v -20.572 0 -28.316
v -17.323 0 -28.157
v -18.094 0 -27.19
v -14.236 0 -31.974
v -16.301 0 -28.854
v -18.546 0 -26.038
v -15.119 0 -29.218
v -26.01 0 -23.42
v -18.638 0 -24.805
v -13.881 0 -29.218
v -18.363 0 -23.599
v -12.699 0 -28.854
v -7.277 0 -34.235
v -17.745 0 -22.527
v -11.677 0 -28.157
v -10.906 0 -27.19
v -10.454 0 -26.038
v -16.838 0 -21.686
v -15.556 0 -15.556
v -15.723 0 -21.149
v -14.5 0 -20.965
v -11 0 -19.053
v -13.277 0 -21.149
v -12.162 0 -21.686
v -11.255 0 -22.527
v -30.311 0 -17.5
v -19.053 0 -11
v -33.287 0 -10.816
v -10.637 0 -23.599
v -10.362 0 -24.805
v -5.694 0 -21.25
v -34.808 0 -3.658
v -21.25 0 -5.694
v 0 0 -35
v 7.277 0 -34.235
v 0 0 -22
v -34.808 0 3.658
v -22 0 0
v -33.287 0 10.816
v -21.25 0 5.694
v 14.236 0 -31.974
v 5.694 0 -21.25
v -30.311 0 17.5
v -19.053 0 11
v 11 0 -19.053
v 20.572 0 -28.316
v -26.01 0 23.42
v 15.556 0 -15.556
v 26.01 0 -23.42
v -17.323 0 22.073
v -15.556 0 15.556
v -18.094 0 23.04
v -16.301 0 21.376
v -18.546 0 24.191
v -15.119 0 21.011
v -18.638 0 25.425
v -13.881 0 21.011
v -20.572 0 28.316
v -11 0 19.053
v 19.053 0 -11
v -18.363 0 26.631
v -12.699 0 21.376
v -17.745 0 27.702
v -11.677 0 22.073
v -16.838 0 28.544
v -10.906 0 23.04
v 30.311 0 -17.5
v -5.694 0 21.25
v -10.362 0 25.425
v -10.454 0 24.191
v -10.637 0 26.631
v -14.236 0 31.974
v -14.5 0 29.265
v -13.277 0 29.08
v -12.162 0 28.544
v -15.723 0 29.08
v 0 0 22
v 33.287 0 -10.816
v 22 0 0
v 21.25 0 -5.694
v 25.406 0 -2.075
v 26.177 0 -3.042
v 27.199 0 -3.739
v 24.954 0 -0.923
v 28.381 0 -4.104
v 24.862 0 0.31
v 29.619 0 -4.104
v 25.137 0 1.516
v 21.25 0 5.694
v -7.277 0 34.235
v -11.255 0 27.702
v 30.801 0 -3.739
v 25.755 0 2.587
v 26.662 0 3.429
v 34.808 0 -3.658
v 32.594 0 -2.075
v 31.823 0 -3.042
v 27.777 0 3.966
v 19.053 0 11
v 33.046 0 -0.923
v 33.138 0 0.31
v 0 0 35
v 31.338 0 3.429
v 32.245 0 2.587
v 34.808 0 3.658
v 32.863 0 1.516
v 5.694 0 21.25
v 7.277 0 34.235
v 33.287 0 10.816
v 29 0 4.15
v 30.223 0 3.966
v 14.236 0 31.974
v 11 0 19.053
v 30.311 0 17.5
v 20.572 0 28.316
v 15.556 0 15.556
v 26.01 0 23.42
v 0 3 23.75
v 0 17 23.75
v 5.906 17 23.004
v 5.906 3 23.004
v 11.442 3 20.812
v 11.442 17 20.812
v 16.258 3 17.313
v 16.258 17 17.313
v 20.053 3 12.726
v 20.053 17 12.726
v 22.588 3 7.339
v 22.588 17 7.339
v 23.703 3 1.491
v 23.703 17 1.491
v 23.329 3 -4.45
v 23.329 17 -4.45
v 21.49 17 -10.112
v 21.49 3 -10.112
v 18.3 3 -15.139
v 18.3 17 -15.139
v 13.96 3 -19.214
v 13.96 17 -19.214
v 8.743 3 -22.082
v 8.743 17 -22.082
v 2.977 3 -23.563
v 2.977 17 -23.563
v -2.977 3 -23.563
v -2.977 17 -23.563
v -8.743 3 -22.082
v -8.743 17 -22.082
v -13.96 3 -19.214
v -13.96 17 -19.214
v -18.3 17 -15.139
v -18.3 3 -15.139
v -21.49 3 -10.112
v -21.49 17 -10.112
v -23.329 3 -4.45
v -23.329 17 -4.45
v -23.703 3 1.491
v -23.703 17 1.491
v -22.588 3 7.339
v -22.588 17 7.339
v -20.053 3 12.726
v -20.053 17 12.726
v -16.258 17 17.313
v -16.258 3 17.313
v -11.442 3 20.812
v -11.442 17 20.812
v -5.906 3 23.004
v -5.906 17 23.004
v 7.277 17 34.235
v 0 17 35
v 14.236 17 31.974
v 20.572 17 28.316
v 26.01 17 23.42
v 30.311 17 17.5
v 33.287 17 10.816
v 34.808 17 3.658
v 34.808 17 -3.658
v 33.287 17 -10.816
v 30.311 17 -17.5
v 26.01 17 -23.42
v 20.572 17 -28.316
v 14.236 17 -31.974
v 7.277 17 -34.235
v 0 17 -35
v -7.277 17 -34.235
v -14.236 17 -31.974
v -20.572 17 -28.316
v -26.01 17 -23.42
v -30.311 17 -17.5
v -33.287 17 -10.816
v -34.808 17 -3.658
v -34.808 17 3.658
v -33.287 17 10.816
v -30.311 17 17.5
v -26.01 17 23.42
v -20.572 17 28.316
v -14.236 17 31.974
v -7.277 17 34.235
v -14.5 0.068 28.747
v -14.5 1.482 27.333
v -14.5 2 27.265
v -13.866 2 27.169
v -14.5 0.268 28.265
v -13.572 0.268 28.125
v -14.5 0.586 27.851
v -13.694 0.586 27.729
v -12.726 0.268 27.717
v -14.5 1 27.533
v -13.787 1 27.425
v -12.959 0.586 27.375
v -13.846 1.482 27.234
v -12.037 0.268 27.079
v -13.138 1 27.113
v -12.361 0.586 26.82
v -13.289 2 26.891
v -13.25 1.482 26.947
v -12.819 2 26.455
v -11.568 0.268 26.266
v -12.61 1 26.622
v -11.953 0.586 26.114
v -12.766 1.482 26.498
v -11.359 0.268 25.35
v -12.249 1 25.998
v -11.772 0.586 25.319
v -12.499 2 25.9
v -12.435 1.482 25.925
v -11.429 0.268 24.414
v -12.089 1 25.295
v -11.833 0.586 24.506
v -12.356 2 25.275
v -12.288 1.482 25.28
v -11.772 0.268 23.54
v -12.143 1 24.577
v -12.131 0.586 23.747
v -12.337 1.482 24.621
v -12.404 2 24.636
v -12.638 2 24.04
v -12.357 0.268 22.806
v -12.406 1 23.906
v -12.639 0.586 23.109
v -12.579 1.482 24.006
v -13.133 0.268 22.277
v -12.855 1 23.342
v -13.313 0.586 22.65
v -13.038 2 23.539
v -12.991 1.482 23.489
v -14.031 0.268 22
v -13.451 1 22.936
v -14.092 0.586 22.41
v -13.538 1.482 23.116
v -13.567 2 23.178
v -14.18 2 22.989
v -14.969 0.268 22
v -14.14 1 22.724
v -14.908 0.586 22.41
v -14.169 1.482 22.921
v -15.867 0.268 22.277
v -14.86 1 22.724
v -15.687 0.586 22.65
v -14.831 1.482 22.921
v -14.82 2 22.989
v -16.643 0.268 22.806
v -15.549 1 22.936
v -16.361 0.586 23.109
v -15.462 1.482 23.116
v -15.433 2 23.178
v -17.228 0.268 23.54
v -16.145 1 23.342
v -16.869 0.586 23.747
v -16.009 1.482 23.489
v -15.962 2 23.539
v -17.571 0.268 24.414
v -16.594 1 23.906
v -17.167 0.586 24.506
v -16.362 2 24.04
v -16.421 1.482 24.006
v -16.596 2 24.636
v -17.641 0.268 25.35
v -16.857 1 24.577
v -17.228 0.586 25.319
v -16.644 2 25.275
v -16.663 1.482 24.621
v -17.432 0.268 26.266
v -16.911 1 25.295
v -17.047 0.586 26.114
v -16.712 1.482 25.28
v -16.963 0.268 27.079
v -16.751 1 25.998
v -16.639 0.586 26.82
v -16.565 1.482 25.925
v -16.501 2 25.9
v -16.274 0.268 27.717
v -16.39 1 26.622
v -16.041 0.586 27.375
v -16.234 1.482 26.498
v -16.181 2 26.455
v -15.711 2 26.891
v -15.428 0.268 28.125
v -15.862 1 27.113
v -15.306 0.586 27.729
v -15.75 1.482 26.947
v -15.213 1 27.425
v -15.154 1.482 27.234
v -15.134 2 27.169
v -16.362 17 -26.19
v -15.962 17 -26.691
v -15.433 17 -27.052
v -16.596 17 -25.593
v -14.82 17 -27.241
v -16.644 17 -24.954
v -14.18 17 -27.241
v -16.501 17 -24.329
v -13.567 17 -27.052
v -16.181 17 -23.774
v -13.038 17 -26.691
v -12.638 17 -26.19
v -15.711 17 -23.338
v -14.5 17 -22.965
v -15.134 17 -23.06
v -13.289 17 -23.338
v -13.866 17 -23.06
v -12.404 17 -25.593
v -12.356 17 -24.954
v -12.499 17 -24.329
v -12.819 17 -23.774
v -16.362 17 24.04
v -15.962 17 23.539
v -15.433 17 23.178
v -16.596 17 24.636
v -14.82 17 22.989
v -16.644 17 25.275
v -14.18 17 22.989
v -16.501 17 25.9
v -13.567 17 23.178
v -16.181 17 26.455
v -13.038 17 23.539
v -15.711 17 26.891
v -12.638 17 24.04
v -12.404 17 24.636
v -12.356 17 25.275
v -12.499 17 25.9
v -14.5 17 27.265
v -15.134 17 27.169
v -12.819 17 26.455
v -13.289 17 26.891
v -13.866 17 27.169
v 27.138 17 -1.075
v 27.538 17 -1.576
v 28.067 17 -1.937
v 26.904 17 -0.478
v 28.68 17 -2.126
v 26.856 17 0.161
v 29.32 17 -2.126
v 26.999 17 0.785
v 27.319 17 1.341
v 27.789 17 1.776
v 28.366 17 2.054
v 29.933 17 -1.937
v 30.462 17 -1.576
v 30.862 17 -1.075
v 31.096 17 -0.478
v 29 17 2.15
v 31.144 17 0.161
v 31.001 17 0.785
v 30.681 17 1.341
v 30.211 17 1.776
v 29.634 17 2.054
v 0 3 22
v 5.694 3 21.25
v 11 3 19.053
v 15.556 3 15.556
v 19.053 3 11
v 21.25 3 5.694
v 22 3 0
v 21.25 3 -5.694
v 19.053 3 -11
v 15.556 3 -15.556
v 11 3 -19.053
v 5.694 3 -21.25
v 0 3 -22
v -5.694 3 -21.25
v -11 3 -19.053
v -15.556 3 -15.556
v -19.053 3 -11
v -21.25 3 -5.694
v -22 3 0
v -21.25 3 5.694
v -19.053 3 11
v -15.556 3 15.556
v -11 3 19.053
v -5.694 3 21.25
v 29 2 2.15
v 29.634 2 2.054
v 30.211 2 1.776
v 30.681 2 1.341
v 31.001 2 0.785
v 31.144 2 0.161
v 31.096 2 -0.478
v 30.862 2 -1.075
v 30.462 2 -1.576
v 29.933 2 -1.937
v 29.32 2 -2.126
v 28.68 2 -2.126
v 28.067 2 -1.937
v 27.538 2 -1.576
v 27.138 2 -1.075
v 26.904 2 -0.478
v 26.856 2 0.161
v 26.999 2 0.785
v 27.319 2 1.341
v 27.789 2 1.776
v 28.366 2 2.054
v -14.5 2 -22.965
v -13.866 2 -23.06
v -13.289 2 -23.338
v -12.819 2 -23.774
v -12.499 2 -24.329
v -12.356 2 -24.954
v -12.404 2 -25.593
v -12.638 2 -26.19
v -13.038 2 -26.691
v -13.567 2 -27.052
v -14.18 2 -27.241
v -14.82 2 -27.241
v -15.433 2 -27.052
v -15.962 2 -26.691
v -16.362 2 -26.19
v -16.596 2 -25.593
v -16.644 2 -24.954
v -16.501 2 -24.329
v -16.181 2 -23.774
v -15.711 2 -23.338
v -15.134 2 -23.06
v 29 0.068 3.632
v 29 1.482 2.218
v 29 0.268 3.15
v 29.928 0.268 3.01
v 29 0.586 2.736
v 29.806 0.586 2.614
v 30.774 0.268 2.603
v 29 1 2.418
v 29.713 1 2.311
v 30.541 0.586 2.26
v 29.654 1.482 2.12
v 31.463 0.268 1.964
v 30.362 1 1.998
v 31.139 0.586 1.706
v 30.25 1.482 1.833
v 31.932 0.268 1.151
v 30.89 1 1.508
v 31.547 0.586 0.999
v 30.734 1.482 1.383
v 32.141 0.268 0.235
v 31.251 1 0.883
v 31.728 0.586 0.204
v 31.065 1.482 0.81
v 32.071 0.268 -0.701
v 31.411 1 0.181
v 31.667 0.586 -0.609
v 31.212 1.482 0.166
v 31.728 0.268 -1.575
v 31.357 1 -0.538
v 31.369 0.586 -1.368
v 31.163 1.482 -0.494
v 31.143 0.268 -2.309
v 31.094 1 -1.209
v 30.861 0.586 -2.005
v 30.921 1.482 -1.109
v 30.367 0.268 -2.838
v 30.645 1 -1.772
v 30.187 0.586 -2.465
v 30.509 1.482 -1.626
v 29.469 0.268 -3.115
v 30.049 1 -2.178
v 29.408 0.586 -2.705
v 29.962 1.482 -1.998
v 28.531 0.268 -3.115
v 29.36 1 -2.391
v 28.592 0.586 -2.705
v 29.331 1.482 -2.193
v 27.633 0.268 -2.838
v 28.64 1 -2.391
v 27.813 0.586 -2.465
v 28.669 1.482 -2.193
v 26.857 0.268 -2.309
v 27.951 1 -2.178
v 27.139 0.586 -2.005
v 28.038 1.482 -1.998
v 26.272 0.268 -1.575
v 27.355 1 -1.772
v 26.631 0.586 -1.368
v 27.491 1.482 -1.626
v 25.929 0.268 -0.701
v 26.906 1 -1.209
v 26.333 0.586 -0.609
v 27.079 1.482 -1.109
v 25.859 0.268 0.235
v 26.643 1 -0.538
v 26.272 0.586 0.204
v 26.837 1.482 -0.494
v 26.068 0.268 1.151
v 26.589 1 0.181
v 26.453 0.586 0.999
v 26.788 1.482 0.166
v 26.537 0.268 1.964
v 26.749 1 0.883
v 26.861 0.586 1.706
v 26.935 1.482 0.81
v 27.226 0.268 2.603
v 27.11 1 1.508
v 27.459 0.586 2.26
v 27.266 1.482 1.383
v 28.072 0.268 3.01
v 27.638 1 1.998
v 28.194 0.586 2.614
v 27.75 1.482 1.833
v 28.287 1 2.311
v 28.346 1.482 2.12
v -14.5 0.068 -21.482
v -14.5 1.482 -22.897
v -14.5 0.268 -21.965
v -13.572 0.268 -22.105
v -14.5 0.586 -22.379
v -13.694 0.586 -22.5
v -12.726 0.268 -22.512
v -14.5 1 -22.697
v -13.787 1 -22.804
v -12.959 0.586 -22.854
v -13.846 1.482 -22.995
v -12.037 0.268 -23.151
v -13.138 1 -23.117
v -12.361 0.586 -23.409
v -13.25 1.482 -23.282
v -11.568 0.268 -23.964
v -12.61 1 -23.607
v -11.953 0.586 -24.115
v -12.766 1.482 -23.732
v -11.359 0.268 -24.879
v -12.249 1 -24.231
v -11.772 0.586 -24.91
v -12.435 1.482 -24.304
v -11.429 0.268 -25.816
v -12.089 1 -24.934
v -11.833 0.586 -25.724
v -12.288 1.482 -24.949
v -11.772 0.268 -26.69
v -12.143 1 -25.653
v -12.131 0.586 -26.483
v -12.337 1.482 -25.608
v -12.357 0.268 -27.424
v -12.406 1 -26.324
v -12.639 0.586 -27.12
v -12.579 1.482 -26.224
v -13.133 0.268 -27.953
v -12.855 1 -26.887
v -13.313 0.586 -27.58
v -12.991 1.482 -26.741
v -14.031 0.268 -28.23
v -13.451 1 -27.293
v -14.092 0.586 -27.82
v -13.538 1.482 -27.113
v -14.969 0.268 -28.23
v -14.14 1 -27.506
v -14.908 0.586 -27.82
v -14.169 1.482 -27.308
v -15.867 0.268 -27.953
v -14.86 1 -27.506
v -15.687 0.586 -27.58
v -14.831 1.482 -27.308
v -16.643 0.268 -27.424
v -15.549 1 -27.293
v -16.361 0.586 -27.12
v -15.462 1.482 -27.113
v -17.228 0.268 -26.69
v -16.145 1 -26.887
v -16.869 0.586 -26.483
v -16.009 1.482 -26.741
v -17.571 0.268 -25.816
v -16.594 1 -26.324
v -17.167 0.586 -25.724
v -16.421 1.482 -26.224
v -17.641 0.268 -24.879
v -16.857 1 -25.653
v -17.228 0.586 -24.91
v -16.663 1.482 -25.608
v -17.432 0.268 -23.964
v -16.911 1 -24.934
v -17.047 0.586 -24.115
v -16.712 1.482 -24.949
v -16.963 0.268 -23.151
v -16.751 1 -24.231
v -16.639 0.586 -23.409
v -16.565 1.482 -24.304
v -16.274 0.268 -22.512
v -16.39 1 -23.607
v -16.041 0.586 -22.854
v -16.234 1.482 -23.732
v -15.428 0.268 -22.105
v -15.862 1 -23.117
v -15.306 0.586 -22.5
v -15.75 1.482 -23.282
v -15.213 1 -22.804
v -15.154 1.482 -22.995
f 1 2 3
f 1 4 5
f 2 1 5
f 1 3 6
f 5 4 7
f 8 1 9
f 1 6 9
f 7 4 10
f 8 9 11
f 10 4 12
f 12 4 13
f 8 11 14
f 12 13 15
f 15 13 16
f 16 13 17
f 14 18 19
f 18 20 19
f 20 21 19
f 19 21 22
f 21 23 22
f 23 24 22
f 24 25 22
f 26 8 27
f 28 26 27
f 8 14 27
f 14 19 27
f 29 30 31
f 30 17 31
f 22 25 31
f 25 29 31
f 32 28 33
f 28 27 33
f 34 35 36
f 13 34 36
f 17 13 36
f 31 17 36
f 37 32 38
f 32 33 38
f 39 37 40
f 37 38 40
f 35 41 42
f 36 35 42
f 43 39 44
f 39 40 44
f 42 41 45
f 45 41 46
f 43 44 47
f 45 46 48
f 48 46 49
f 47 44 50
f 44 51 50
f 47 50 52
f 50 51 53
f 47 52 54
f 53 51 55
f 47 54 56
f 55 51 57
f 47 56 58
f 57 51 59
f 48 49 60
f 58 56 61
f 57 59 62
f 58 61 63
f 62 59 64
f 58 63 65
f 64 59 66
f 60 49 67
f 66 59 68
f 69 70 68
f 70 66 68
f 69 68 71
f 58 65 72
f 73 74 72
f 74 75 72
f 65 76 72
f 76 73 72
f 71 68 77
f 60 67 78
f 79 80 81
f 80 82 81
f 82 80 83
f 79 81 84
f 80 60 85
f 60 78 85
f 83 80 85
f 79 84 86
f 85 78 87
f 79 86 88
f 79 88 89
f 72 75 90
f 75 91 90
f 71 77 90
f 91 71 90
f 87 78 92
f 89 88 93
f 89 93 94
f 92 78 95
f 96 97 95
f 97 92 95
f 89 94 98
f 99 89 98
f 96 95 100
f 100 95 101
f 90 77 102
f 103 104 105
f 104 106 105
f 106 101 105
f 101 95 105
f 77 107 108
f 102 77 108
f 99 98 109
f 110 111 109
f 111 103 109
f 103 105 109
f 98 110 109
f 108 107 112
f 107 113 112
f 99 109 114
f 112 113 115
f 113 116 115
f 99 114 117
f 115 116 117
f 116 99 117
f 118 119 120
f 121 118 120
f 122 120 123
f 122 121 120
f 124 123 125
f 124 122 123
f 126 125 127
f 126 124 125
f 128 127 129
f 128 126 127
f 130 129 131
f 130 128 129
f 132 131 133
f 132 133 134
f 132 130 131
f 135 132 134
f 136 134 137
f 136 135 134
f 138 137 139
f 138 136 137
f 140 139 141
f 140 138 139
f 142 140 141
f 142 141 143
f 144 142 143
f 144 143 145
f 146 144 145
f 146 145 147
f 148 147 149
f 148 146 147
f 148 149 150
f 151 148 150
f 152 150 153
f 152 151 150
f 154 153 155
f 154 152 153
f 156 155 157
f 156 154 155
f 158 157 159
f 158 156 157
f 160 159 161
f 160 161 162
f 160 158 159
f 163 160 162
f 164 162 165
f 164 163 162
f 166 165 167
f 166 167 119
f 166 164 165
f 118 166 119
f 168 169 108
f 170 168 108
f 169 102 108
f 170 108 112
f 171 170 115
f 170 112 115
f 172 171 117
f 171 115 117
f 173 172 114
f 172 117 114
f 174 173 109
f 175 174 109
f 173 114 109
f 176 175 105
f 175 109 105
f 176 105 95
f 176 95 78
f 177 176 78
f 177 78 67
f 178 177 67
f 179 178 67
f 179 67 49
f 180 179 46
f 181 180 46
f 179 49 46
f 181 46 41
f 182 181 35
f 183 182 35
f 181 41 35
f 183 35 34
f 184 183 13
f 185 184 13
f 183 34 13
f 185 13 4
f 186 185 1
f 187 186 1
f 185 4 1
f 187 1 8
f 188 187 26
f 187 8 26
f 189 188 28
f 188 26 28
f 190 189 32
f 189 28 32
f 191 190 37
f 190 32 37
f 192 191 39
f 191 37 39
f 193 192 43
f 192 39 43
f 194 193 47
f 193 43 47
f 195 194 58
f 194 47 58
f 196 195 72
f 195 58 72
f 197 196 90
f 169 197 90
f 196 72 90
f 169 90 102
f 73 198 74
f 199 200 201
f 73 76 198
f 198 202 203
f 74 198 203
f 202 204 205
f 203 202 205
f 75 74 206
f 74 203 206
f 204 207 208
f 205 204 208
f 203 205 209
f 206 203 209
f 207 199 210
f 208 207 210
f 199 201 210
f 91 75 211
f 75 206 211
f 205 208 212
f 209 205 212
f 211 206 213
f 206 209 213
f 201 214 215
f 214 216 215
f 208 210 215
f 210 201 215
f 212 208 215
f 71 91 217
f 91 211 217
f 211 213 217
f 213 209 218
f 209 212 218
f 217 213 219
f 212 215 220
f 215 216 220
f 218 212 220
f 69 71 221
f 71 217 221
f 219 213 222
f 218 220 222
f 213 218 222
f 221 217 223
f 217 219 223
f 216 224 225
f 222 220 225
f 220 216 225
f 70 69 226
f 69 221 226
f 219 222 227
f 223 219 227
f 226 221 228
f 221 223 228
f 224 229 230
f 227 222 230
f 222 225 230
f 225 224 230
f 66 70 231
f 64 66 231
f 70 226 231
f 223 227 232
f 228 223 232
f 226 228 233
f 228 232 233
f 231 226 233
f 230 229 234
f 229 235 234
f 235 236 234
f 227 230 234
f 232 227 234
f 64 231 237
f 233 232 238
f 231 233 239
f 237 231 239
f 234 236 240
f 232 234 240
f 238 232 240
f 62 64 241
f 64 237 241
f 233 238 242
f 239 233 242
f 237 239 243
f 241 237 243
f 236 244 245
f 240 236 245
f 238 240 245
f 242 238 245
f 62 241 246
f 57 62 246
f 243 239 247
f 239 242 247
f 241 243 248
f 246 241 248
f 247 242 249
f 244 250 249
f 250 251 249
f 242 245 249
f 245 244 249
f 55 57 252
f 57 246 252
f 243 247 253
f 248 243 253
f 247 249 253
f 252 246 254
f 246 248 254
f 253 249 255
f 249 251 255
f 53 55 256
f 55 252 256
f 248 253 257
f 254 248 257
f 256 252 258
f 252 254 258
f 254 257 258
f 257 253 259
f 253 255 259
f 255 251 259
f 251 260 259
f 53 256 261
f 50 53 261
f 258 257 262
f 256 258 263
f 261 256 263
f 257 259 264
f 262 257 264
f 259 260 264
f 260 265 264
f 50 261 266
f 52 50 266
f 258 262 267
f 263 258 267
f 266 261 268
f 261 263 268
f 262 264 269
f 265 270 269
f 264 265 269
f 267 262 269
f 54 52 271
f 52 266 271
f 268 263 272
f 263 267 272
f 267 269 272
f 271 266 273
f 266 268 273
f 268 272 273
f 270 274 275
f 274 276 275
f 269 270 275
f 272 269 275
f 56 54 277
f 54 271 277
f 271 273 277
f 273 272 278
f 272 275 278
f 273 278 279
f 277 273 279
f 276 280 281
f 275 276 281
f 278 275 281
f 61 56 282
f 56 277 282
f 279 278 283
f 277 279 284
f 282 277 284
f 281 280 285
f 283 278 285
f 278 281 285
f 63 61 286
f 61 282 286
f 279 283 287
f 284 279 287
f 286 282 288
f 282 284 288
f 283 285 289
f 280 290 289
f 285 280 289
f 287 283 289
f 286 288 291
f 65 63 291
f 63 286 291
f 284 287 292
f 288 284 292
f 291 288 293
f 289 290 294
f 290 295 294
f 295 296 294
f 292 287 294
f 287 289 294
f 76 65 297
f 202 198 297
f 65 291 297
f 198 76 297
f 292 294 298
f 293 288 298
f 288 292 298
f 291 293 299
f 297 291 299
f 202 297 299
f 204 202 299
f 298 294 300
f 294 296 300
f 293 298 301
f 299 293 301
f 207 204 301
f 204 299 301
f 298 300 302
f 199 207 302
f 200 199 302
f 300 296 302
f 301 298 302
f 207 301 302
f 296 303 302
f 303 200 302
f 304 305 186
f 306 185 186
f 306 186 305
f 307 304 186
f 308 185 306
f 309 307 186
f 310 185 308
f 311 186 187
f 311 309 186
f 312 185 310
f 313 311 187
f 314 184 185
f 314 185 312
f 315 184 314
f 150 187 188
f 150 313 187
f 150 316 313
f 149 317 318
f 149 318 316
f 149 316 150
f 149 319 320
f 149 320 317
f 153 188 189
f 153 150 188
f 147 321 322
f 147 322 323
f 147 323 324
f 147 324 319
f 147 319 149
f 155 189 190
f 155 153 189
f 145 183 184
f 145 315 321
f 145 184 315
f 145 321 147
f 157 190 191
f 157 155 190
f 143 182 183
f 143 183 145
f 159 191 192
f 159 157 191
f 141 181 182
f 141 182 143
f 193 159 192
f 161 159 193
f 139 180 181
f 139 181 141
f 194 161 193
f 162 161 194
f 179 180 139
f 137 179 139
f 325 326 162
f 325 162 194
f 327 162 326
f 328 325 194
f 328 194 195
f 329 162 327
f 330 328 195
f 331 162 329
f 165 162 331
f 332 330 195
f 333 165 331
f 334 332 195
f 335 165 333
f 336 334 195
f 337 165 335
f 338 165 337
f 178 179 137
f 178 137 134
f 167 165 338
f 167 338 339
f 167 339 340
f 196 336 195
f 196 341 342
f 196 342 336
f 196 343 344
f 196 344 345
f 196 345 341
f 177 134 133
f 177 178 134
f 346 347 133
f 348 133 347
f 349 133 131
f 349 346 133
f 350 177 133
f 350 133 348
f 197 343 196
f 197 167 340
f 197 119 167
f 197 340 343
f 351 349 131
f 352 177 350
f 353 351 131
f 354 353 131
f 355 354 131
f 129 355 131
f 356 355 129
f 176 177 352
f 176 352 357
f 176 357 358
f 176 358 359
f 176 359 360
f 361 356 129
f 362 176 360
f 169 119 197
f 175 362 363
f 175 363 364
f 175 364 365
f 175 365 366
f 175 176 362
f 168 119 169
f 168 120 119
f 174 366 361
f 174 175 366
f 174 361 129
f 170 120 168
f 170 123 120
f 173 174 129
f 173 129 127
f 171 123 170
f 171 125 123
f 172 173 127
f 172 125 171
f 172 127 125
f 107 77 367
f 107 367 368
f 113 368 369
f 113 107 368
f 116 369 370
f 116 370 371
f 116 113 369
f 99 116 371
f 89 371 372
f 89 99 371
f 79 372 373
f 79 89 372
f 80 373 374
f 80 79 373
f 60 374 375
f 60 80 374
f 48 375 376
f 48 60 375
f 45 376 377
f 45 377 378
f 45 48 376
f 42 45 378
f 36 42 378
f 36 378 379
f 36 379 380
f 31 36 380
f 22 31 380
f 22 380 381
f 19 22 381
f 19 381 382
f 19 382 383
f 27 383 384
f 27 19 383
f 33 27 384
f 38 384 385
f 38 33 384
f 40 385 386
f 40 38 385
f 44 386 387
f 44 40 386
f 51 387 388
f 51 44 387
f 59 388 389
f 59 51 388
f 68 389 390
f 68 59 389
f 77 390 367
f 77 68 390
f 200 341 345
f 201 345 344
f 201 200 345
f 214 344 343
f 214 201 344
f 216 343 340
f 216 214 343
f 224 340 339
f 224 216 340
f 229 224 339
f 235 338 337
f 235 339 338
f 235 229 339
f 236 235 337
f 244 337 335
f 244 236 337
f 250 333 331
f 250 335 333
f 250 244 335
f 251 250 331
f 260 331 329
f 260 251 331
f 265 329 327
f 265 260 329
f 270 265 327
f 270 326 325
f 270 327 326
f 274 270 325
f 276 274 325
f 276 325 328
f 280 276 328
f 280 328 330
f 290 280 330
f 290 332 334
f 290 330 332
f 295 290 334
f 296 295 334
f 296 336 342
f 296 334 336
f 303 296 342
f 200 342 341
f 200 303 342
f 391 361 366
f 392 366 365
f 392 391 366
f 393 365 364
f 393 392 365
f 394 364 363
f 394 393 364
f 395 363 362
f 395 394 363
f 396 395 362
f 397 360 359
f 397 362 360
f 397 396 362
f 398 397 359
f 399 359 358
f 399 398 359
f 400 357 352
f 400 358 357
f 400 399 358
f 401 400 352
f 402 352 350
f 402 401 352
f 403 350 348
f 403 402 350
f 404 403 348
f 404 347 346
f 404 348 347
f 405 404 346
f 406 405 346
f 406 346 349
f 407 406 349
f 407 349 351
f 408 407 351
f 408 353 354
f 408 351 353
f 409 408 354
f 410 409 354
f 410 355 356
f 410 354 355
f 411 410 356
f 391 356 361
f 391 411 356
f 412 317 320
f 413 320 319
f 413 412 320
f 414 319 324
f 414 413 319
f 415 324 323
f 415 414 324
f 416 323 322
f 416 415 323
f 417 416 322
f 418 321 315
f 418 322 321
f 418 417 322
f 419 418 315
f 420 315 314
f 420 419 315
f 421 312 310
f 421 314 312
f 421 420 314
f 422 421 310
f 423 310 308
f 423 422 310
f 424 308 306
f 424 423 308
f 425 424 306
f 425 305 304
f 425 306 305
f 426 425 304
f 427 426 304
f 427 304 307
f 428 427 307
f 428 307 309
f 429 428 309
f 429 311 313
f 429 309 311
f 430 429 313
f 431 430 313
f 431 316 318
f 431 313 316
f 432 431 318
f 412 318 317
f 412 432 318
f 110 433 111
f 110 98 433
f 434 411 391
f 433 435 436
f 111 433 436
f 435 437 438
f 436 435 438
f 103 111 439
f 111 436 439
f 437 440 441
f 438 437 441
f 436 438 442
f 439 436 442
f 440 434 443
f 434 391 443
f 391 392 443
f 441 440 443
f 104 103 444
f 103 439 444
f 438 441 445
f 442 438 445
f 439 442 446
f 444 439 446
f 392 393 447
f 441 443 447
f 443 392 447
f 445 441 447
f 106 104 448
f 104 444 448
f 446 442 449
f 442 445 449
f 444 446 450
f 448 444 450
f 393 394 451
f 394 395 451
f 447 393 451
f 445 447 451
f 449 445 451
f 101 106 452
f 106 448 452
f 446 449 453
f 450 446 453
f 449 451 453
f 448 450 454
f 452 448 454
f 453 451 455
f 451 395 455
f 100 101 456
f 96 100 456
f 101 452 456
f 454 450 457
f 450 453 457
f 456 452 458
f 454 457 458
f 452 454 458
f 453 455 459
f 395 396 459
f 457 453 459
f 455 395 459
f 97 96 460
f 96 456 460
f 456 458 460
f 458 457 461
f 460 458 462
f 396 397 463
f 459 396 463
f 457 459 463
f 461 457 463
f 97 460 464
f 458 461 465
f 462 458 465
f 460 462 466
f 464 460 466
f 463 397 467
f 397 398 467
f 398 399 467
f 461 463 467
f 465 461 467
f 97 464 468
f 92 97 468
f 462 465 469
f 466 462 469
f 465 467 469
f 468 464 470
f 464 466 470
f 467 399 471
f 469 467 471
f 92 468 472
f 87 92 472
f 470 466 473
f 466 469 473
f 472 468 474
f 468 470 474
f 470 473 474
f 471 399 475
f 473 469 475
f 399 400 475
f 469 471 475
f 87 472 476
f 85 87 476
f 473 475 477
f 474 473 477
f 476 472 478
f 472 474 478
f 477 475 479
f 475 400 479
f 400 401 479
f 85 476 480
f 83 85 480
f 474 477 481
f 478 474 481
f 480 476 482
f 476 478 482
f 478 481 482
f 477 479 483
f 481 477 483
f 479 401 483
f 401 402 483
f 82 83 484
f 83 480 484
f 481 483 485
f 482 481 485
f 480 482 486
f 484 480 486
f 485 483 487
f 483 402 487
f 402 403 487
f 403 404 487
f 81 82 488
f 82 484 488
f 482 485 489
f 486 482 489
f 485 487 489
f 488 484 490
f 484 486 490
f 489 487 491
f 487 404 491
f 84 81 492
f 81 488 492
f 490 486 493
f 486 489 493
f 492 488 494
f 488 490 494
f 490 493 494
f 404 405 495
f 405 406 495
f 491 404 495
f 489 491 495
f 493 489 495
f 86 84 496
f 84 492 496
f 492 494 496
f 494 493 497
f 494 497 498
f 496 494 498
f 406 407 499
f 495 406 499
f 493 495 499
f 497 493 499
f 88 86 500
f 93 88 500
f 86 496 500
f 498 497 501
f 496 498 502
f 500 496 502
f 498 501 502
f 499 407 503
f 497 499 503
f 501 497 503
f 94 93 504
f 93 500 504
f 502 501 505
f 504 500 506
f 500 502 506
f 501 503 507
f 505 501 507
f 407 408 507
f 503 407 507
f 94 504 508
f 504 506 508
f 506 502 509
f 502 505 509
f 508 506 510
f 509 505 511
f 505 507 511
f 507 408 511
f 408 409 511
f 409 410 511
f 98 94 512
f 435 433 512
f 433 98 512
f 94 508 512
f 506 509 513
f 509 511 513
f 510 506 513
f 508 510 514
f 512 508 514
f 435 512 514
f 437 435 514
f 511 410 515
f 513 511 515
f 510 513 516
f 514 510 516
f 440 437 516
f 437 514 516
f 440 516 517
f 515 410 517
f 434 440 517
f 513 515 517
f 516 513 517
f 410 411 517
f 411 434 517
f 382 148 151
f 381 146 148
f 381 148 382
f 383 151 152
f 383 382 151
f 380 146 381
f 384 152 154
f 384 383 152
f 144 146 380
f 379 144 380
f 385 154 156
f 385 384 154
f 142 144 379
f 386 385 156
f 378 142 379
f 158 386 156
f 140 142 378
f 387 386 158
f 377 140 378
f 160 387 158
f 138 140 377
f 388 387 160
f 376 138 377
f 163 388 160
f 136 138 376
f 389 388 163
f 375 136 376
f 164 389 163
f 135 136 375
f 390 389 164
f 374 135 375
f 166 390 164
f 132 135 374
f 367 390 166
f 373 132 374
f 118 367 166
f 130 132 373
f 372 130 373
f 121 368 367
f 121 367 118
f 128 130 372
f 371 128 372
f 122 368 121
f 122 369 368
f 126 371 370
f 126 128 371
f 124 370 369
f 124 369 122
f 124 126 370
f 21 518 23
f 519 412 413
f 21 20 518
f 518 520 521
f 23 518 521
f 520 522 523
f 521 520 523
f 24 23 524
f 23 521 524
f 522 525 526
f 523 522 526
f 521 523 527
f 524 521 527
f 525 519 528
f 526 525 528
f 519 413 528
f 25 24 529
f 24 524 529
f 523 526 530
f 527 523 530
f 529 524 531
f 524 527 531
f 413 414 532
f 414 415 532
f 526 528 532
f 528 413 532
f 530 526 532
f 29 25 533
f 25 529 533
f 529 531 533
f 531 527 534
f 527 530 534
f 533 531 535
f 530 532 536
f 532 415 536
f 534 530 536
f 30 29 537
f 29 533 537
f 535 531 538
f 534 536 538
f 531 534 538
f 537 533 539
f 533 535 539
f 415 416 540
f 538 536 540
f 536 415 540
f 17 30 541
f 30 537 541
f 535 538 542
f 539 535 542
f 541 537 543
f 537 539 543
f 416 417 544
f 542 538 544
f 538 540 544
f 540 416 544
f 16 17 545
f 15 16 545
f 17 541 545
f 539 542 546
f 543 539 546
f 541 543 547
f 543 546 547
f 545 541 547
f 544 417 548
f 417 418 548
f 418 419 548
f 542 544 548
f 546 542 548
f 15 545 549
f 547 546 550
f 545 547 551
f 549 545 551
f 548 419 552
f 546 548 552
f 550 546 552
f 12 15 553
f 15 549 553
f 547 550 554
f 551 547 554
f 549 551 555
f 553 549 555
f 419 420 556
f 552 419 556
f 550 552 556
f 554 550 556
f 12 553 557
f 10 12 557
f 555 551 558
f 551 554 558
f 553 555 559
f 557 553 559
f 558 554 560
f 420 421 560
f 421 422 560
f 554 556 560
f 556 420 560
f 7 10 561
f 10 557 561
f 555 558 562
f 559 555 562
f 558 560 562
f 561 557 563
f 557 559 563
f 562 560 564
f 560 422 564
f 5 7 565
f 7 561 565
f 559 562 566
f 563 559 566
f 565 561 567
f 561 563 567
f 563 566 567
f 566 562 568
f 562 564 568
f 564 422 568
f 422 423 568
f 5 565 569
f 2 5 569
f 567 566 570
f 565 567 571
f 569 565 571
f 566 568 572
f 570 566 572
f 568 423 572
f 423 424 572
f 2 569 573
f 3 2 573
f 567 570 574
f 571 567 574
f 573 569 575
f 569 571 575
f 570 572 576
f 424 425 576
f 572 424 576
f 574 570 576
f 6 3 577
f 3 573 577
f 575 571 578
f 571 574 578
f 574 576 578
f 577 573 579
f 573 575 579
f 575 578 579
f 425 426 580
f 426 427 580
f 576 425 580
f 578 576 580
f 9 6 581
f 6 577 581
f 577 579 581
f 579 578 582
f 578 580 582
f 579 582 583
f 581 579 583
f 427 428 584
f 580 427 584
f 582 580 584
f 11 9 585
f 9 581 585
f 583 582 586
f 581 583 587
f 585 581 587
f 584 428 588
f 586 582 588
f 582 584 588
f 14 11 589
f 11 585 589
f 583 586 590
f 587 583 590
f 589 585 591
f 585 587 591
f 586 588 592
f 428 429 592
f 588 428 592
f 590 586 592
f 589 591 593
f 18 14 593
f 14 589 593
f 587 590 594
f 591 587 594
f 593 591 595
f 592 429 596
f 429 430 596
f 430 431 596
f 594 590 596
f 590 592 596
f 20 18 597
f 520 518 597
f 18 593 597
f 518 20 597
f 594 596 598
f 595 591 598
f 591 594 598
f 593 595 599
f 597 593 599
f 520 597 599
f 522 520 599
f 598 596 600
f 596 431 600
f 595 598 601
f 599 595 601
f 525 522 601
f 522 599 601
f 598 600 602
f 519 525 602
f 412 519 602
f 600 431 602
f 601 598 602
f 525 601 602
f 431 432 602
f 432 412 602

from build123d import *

# Parameters (mm, degrees)
SKETCH_1_R          = 35
SKETCH_1_R_2        = 22
EXTRUDE_1_DEPTH     = 3
SKETCH_2_R          = 35
SKETCH_2_R_2        = 23.75
EXTRUDE_2_DEPTH     = 14
SKETCH_4_R          = 2.15
CUT_EXTRUDE_1_DEPTH = 70
FILLET_1_R          = 2


with BuildPart() as part:
    # 草图1 → 凸台-拉伸1 (new body)
    with BuildSketch(Plane(origin=(0, 0, 0), x_dir=(1, 0, 0), z_dir=(0, 1, 0))):
        with Locations(Location((0, 0, 0), (0, 0, 270))):
            Circle(SKETCH_1_R)
        with Locations(Location((0, 0, 0), (0, 0, 270))):
            Circle(SKETCH_1_R_2, mode=Mode.SUBTRACT)
    extrude(amount=EXTRUDE_1_DEPTH)

    # 草图2 → 凸台-拉伸2 (add)
    with BuildSketch(Plane(origin=(0, 3, 0), x_dir=(1, 0, 0), z_dir=(0, 1, 0))):
        with Locations(Location((0, 0, 0), (0, 0, 270))):
            Circle(SKETCH_2_R)
        with Locations(Location((0, 0, 0), (0, 0, 270))):
            Circle(SKETCH_2_R_2, mode=Mode.SUBTRACT)
    extrude(amount=EXTRUDE_2_DEPTH)

    # 草图4 → 切除-拉伸1 (cut)
    with BuildSketch(Plane(origin=(0, 0, 0), x_dir=(1, 0, 0), z_dir=(0, 1, 0))):
        with Locations(Location((29, 0, 0), (0, 0, 270))):
            Circle(SKETCH_4_R)
        with Locations(Location((-14.5, -25.11473671, 0), (0, 0, 270))):
            Circle(SKETCH_4_R)
        with Locations(Location((-14.5, 25.11473671, 0), (0, 0, 270))):
            Circle(SKETCH_4_R)
    extrude(amount=CUT_EXTRUDE_1_DEPTH, mode=Mode.SUBTRACT)

    # 圆角1
    fillet_1_edges = [part.edges().sort_by_distance(p)[0] for p in [
        (29, 0, -2.15),
        (-14.5, 0, 22.96473671),
        (-14.5, 0, -27.26473671),
    ]]
    fillet(fillet_1_edges, radius=FILLET_1_R)


solid = part.part
